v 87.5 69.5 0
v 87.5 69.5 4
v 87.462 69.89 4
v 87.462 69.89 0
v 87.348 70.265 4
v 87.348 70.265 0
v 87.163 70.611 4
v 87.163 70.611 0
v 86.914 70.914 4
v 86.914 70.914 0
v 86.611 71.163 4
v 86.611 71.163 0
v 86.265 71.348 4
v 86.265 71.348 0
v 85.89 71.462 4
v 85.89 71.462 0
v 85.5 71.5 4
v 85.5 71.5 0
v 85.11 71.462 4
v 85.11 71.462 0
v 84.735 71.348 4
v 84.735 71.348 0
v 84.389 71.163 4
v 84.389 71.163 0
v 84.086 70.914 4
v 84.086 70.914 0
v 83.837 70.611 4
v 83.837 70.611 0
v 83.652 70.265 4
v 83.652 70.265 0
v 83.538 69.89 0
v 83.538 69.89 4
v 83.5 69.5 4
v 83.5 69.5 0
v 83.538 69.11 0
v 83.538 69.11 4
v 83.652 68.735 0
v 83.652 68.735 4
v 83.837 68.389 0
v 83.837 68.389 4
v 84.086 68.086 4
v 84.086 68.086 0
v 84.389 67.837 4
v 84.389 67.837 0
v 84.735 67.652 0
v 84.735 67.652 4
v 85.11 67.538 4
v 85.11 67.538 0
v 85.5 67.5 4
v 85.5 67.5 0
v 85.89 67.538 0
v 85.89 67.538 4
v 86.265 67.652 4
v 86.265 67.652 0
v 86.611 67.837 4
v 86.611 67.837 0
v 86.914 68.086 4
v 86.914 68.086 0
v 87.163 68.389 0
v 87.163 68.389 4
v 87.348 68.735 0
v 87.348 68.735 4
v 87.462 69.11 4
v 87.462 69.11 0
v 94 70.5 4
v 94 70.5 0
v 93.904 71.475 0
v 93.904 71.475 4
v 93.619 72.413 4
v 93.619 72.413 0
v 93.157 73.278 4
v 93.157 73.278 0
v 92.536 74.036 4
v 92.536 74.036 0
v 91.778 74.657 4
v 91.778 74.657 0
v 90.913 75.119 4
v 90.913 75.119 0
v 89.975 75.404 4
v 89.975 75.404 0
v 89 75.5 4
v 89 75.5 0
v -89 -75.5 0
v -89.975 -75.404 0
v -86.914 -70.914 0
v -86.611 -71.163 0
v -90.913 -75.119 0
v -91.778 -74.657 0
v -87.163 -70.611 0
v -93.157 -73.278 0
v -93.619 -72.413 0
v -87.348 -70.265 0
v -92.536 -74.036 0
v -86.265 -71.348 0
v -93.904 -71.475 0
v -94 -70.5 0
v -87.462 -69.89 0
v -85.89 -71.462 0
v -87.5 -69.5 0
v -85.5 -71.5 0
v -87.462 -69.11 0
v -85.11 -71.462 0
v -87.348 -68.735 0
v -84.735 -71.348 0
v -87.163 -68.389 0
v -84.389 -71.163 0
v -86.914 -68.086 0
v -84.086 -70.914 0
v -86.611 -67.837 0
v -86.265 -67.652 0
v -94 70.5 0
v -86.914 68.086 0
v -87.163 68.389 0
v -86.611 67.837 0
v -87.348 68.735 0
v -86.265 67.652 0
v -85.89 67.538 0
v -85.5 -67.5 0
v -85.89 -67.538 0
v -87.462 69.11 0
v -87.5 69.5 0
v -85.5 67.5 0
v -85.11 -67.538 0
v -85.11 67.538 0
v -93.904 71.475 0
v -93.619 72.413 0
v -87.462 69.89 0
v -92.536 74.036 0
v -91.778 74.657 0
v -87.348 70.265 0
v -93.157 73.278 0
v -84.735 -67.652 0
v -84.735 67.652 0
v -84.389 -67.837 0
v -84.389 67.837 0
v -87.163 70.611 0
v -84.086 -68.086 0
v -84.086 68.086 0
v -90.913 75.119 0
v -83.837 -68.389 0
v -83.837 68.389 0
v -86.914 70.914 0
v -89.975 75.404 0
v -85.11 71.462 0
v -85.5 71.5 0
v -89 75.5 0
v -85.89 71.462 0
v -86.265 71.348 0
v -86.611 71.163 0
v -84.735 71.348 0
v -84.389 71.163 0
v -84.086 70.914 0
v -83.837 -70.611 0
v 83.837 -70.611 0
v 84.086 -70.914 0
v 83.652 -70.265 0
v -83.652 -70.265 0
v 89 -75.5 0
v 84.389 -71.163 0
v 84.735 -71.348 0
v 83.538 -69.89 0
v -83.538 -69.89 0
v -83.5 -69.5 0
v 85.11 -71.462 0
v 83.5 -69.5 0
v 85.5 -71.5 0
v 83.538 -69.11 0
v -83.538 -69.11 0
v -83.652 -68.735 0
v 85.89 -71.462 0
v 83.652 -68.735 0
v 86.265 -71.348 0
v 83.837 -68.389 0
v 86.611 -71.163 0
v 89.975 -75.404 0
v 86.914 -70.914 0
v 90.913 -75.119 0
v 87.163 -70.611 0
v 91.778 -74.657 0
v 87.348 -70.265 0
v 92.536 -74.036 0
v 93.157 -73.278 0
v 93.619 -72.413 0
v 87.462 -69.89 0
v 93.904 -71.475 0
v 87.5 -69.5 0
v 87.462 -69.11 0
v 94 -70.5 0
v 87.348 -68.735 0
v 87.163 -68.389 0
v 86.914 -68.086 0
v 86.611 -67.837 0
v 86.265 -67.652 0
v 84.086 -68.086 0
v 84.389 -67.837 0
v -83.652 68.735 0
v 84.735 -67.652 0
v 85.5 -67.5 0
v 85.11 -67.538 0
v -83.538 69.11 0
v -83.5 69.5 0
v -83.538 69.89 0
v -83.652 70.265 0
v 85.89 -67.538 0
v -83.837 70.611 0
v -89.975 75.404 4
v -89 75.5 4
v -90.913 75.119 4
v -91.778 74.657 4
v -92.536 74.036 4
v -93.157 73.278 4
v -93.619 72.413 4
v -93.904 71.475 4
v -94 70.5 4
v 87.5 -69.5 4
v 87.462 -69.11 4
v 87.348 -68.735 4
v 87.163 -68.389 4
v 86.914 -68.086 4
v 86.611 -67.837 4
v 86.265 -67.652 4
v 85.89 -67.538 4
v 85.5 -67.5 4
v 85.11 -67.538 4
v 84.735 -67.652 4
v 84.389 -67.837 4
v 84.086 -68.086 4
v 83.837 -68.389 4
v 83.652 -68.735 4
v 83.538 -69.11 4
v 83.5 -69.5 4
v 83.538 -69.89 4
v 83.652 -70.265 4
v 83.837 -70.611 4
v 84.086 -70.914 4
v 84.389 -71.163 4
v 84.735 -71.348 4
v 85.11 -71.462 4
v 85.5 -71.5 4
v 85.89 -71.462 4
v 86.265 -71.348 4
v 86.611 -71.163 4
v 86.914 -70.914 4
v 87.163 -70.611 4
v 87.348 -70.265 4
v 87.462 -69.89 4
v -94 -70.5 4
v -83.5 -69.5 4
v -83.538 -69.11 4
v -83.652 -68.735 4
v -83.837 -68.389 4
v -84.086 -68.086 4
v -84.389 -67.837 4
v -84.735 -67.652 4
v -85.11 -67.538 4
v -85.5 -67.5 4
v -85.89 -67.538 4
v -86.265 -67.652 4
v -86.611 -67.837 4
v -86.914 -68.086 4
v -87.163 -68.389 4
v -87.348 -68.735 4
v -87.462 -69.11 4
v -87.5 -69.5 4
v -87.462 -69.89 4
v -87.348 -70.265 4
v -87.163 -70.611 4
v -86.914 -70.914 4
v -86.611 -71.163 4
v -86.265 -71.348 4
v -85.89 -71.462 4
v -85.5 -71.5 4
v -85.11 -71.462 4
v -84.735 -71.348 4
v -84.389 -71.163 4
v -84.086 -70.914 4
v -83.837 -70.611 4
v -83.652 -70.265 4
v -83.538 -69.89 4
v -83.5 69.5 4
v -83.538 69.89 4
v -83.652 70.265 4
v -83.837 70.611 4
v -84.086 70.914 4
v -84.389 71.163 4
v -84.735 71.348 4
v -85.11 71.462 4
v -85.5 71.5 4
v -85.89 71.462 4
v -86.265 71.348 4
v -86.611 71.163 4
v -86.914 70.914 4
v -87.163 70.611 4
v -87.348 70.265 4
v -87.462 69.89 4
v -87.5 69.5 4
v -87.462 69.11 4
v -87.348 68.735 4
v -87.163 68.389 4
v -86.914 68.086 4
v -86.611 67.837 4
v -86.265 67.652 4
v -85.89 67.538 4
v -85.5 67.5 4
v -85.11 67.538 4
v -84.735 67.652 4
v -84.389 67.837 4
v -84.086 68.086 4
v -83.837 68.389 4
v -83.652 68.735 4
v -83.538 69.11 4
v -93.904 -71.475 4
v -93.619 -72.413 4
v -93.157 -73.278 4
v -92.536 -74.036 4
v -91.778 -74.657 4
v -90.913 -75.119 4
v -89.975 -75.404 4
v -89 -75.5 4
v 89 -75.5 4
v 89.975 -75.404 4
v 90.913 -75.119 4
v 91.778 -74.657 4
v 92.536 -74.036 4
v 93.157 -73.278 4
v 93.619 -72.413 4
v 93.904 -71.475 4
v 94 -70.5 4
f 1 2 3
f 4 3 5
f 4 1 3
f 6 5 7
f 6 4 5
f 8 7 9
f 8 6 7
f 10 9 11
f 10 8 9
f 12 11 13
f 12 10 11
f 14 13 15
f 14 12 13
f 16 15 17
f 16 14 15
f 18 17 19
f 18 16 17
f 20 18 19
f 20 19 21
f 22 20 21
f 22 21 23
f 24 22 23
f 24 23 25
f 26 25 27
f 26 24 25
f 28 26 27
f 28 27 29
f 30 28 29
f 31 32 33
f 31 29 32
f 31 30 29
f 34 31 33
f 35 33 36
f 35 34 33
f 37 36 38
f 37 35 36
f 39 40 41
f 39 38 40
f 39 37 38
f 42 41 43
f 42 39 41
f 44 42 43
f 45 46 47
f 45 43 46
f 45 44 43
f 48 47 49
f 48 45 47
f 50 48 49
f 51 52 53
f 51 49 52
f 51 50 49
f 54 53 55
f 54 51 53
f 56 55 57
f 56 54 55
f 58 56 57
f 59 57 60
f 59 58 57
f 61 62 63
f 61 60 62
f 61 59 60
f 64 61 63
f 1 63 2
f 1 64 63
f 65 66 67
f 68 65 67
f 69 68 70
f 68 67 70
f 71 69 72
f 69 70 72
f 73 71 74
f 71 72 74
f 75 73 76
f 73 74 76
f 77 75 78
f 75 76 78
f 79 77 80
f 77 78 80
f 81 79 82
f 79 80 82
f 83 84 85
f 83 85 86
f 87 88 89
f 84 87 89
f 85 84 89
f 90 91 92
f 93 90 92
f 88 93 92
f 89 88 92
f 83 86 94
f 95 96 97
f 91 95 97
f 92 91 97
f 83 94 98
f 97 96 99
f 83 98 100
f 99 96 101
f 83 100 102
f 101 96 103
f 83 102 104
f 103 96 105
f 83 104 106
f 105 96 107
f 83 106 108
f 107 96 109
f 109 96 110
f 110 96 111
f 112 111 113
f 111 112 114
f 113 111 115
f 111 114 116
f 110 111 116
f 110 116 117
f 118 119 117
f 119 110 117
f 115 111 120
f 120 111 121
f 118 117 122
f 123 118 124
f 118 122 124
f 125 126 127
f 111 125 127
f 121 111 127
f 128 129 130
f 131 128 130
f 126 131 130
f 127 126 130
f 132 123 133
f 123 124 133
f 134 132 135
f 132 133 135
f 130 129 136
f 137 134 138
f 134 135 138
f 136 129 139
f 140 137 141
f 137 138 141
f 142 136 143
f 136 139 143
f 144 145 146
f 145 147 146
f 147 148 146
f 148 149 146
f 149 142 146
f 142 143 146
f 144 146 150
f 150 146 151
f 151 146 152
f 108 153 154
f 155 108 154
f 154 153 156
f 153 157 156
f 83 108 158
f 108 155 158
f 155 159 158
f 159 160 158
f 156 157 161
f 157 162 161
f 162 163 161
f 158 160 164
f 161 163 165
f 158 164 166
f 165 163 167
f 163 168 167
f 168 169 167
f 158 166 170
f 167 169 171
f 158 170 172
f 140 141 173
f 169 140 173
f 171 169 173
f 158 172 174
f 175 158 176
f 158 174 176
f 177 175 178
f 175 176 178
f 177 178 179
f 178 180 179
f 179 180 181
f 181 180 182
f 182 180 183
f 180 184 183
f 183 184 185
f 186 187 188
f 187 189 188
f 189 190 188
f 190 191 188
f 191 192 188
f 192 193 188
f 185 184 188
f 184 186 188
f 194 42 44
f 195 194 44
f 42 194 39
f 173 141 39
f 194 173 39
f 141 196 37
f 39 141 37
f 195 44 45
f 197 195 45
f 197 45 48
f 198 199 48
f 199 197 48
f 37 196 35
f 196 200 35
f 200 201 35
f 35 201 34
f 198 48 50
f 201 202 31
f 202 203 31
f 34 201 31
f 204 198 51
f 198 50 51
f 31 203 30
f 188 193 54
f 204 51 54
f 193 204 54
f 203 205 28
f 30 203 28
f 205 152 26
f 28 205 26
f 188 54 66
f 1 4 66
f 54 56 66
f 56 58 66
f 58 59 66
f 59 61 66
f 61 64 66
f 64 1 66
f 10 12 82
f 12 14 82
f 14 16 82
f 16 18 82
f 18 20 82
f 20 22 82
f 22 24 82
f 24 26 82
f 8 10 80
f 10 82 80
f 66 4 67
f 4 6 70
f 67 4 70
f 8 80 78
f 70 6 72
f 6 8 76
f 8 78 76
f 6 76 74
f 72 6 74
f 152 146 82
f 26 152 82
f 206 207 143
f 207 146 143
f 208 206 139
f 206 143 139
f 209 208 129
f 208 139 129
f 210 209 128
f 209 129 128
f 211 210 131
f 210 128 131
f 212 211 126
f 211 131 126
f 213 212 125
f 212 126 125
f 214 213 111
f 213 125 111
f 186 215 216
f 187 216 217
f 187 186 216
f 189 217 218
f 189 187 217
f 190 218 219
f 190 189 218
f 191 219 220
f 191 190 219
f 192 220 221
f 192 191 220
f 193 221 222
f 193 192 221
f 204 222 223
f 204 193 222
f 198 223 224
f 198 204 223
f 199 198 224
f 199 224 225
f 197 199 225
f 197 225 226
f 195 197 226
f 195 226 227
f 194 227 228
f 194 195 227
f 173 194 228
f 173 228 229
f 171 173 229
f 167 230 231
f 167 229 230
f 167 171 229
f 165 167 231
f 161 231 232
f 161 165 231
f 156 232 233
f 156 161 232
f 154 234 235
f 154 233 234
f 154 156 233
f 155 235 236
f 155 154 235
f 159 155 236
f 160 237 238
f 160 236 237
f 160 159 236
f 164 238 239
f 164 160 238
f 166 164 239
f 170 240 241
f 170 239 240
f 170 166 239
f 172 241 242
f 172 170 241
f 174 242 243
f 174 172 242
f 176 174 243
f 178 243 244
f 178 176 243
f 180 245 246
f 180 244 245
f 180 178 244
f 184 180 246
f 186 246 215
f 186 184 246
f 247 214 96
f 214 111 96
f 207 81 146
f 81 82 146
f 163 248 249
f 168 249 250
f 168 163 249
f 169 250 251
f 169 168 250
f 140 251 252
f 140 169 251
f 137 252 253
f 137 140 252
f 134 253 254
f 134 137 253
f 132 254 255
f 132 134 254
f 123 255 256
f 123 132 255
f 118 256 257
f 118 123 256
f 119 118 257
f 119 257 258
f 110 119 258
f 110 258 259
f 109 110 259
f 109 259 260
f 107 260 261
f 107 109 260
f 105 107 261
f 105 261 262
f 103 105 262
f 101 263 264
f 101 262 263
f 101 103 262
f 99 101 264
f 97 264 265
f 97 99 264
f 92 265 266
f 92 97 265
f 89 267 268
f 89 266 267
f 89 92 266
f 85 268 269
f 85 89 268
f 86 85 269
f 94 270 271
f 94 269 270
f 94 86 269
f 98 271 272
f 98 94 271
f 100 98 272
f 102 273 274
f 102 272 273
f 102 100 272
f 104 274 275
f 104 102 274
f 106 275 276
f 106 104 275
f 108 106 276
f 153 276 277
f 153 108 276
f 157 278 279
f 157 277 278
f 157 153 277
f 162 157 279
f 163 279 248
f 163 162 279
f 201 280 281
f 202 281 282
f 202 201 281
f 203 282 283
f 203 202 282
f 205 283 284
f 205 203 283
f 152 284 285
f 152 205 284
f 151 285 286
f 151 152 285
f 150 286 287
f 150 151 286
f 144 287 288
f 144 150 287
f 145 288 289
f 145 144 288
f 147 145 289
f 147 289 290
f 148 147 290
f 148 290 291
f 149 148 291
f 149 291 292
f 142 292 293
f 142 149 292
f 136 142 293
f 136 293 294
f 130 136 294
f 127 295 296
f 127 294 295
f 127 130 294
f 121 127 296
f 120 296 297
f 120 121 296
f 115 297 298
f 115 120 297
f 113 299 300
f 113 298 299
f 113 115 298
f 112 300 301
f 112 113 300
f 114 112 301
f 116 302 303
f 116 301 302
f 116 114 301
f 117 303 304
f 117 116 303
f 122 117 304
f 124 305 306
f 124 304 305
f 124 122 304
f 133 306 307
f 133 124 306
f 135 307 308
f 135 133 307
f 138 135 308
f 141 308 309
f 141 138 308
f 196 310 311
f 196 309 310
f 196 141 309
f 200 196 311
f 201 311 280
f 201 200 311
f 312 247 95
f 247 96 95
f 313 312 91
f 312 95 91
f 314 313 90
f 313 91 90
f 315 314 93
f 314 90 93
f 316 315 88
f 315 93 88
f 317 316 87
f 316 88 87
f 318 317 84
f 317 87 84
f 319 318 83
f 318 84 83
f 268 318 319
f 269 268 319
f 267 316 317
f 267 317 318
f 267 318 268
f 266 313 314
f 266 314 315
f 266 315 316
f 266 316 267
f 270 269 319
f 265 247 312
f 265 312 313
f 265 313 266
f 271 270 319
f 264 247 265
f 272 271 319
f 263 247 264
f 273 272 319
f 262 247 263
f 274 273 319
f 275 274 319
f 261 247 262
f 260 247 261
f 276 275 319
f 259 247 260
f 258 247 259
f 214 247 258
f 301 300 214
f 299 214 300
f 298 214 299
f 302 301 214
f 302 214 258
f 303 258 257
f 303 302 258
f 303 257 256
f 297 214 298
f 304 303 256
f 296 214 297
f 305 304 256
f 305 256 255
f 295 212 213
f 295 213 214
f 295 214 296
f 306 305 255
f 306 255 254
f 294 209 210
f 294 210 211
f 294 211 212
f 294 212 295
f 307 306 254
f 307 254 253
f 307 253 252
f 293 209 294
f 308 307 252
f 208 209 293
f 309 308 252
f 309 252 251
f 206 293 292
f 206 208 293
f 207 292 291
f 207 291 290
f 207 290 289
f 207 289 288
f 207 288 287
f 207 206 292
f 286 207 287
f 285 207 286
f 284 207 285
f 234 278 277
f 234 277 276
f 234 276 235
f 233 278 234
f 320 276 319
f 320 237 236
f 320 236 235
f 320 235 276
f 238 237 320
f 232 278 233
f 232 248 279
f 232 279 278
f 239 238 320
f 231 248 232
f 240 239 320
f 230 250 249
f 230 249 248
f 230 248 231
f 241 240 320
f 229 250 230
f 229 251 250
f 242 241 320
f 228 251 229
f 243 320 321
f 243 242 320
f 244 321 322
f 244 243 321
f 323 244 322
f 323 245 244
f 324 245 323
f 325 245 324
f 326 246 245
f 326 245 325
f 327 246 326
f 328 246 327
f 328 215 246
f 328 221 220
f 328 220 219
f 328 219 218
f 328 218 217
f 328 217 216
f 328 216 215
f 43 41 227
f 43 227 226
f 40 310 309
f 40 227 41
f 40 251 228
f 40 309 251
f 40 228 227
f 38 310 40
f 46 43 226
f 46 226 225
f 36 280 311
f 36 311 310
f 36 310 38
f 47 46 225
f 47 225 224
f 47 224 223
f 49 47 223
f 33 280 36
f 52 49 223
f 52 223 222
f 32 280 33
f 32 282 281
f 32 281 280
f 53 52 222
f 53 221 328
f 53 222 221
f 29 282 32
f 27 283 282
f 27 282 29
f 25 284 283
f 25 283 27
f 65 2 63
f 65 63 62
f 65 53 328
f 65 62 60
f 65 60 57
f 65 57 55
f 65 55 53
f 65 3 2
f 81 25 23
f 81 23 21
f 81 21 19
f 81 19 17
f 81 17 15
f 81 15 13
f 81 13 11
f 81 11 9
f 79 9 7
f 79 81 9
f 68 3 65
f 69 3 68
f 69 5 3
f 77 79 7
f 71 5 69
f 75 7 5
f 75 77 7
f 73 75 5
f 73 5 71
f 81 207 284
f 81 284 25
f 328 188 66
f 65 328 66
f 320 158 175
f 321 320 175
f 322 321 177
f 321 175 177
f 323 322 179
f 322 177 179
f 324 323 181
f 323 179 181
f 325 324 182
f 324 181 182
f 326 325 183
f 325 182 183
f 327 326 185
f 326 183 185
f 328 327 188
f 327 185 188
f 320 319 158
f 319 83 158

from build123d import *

# Parameters (mm, degrees)
F0_R     = 2
F1_DEPTH = 2
F3_DEPTH = 2
F4_DEPTH = 2.001


with BuildPart() as f1:
    # F0 (on Top) → F1 (new body)
    with BuildSketch(Plane.XY):
        with BuildLine():
            ThreePointArc((94, 70.5), (92.5355339059, 74.0355339059), (89, 75.5))
            Line((89, 75.5), (-89, 75.5))
            ThreePointArc((-89, 75.5), (-92.5355339059, 74.0355339059), (-94, 70.5))
            Line((-94, 70.5), (-94, -70.5))
            ThreePointArc((-94, -70.5), (-92.5355339059, -74.0355339059), (-89, -75.5))
            Line((-89, -75.5), (89, -75.5))
            ThreePointArc((89, -75.5), (92.5355339059, -74.0355339059), (94, -70.5))
            Line((94, -70.5), (94, 70.5))
        make_face()
        with Locations((-85.5, -69.5)):
            Circle(F0_R, mode=Mode.SUBTRACT)
        with Locations((85.5, -69.5)):
            Circle(F0_R, mode=Mode.SUBTRACT)
        with Locations((-85.5, 69.5)):
            Circle(F0_R, mode=Mode.SUBTRACT)
        with Locations((85.5, 69.5)):
            Circle(F0_R, mode=Mode.SUBTRACT)
    extrude(amount=F1_DEPTH)

    # F2 (on face) + F0 (on Top) → F3 (join)
    with BuildSketch(Plane.XY.offset(2)):
        with BuildLine():
            ThreePointArc((94, 70.5), (92.5355339059, 74.0355339059), (89, 75.5))
            Line((89, 75.5), (-89, 75.5))
            ThreePointArc((-89, 75.5), (-92.5355339059, 74.0355339059), (-94, 70.5))
            Line((-94, 70.5), (-94, -70.5))
            ThreePointArc((-94, -70.5), (-92.5355339059, -74.0355339059), (-89, -75.5))
            Line((-89, -75.5), (89, -75.5))
            ThreePointArc((89, -75.5), (92.5355339059, -74.0355339059), (94, -70.5))
            Line((94, -70.5), (94, 70.5))
        make_face()
    with BuildSketch(Plane.XY):
        with BuildLine():
            ThreePointArc((94, 70.5), (92.5355339059, 74.0355339059), (89, 75.5))
            Line((89, 75.5), (-89, 75.5))
            ThreePointArc((-89, 75.5), (-92.5355339059, 74.0355339059), (-94, 70.5))
            Line((-94, 70.5), (-94, -70.5))
            ThreePointArc((-94, -70.5), (-92.5355339059, -74.0355339059), (-89, -75.5))
            Line((-89, -75.5), (89, -75.5))
            ThreePointArc((89, -75.5), (92.5355339059, -74.0355339059), (94, -70.5))
            Line((94, -70.5), (94, 70.5))
        make_face()
        with Locations((-85.5, -69.5)):
            Circle(F0_R, mode=Mode.SUBTRACT)
        with Locations((85.5, -69.5)):
            Circle(F0_R, mode=Mode.SUBTRACT)
        with Locations((-85.5, 69.5)):
            Circle(F0_R, mode=Mode.SUBTRACT)
        with Locations((85.5, 69.5)):
            Circle(F0_R, mode=Mode.SUBTRACT)
    extrude(amount=F3_DEPTH)

    # F4 (cut, through all): faces of the model
    f4_faces = [f1.faces().sort_by_distance(p)[0] for p in [
        (85.5, 69.5, 2),
        (-85.5, 69.5, 2),
        (85.5, -69.5, 2),
        (-85.5, -69.5, 2),
        (85.5, 69.5, 2),
        (-85.5, 69.5, 2),
        (85.5, -69.5, 2),
        (-85.5, -69.5, 2),
        (85.5, 69.5, 2),
        (-85.5, 69.5, 2),
        (85.5, -69.5, 2),
        (-85.5, -69.5, 2),
        (85.5, 69.5, 2),
        (-85.5, 69.5, 2),
        (85.5, -69.5, 2),
        (-85.5, -69.5, 2),
    ]]
    extrude(f4_faces, amount=-F4_DEPTH, mode=Mode.SUBTRACT)


solid = f1.part
